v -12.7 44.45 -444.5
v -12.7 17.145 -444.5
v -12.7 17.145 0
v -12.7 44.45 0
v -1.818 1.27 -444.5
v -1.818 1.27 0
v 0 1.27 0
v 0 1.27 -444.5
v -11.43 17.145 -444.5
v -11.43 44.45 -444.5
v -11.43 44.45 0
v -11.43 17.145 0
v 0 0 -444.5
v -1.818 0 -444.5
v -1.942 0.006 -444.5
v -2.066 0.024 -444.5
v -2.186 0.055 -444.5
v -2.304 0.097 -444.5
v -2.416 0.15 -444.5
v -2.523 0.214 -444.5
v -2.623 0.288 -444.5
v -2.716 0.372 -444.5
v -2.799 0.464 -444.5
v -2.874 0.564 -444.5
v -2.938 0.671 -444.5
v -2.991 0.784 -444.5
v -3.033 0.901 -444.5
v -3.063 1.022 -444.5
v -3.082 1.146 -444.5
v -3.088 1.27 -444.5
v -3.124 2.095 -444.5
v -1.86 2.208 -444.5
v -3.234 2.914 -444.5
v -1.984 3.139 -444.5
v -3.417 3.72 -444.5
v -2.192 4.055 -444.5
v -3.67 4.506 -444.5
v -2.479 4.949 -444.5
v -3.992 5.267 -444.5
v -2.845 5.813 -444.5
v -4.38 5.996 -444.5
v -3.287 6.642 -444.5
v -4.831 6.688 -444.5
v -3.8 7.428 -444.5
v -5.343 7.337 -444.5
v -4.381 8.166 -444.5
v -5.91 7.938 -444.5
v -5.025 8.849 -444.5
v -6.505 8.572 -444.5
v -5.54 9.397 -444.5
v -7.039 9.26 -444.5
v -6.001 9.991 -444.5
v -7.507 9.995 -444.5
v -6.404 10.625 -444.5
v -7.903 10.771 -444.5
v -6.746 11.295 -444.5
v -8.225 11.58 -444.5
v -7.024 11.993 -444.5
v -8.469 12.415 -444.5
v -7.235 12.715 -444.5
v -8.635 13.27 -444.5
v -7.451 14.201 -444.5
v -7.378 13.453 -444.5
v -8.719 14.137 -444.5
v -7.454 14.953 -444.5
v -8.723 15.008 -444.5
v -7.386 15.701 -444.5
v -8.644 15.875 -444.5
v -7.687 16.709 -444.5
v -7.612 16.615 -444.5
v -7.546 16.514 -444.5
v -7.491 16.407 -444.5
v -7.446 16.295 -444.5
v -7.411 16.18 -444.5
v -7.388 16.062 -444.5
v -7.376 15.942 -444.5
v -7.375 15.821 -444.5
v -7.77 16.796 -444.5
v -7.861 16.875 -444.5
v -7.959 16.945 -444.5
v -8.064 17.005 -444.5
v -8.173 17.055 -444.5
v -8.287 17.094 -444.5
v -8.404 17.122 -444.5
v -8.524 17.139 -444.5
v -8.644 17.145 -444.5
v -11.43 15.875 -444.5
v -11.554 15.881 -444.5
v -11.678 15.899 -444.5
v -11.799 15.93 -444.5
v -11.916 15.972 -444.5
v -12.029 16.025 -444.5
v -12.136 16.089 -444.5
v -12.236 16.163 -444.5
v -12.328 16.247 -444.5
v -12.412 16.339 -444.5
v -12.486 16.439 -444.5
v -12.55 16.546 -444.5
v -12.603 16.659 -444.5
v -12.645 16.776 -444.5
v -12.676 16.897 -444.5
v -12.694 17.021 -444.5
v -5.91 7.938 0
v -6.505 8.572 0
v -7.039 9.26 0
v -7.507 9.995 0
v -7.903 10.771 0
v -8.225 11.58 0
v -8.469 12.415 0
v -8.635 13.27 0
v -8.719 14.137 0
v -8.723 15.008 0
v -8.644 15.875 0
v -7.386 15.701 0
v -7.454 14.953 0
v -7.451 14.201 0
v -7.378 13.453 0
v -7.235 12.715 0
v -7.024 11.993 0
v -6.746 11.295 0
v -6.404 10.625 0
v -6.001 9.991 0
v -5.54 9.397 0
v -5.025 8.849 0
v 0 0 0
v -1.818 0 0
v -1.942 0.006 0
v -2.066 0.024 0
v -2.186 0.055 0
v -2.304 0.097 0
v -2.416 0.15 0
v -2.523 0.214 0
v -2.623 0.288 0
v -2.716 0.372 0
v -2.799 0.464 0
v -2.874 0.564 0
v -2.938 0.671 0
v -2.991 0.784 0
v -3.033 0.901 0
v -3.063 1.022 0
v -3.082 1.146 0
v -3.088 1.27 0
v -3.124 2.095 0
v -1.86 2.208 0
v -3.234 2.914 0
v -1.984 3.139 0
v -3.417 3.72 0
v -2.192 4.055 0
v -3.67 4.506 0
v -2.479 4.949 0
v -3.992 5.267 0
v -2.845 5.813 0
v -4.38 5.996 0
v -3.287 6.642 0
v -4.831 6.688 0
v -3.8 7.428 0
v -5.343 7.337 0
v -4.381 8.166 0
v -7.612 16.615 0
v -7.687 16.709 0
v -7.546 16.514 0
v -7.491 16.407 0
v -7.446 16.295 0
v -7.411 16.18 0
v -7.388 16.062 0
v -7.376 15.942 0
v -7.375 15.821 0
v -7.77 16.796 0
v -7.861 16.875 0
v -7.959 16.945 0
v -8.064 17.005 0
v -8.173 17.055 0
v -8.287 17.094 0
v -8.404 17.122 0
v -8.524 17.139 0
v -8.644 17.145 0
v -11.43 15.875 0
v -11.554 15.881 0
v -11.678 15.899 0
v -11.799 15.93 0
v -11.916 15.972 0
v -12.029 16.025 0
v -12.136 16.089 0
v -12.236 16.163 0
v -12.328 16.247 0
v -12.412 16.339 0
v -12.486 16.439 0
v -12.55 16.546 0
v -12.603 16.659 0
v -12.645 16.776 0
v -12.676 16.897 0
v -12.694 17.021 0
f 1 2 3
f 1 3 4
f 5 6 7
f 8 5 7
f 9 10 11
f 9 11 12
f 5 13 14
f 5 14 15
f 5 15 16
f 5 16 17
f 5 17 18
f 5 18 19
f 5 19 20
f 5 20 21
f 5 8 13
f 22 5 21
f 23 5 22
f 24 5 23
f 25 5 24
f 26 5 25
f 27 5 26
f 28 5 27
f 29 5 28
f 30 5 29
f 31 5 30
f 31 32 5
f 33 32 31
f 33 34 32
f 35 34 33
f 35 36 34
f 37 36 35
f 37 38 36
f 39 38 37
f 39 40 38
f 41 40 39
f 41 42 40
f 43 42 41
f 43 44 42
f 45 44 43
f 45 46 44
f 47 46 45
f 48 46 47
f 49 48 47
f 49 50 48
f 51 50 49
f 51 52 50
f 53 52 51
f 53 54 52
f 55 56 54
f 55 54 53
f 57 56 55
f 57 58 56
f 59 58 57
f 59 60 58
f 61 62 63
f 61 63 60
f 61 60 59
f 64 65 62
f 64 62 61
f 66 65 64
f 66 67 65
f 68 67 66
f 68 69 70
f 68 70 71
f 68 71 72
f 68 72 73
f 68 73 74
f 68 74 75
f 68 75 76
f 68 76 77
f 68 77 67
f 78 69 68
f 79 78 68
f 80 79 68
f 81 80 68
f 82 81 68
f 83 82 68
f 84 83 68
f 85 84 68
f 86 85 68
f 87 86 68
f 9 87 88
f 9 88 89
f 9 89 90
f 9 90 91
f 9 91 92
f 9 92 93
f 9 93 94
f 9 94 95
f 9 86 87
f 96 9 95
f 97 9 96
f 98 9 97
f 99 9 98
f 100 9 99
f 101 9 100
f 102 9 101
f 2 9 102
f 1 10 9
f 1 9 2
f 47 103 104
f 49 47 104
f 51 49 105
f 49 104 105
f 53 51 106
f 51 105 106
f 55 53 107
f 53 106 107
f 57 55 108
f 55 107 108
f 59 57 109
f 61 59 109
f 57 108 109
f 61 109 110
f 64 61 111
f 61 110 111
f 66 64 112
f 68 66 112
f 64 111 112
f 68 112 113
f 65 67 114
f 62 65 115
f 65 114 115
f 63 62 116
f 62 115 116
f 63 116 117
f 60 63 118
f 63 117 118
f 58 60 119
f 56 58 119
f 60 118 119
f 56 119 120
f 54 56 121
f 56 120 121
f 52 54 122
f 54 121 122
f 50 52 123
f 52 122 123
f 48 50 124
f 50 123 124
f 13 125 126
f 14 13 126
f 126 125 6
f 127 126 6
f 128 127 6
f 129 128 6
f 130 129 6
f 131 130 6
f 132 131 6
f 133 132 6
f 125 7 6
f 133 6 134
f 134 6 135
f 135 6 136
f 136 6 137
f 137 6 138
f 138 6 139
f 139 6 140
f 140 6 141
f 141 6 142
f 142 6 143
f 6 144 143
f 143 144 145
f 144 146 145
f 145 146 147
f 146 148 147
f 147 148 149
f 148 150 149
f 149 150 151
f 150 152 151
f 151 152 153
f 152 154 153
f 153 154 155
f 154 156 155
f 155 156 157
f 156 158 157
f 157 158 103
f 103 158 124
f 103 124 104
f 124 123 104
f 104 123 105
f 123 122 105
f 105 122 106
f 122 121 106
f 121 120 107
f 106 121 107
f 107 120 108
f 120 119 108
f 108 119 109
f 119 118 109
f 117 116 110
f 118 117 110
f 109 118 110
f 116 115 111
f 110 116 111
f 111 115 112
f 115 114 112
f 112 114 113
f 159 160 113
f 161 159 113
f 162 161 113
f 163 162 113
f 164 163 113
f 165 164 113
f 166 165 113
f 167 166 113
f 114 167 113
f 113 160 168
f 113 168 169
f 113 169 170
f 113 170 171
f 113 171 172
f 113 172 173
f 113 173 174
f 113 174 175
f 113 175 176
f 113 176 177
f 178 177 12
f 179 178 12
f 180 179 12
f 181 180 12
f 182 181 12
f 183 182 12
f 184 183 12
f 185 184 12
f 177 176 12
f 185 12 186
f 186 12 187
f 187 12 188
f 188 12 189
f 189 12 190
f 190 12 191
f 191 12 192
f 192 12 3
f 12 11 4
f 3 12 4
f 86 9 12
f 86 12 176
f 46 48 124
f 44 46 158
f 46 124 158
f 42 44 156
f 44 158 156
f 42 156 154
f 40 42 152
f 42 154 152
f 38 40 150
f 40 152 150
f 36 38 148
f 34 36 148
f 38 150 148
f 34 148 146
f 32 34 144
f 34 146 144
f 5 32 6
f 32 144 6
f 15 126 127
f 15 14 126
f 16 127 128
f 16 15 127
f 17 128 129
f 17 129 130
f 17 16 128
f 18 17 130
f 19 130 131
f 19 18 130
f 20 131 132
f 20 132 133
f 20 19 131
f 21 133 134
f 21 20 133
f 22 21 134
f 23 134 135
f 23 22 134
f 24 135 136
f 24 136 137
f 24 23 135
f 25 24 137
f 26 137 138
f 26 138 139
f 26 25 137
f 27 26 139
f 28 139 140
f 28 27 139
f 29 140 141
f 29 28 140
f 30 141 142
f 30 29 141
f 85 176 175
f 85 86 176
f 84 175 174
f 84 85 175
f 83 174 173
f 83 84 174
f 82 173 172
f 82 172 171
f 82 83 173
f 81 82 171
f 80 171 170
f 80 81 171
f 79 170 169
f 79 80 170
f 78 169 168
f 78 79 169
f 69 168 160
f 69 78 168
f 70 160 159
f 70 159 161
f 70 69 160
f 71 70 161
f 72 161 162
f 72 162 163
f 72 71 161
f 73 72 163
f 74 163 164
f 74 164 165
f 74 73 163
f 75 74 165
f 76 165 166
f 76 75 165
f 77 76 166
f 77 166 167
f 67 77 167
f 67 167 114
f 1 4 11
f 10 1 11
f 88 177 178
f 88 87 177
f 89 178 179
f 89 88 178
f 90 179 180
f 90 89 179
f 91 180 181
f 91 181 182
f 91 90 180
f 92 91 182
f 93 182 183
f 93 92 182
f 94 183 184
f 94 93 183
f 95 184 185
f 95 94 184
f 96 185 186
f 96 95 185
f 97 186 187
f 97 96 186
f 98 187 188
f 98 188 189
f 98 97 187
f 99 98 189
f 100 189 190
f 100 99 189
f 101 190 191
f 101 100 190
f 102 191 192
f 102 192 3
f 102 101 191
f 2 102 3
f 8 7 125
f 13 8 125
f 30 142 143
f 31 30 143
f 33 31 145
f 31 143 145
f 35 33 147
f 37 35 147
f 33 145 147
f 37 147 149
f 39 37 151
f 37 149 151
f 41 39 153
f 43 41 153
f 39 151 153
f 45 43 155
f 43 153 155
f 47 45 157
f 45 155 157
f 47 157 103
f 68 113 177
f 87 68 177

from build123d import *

# Parameters (mm, degrees)
EXTRUDE_THIN1_DEPTH = 444.5
FILLET1_R           = 1.27


with BuildPart() as part:
    # Sketch1 → Extrude-Thin1 (new body)
    with BuildSketch(Plane.XY):
        with BuildLine():
            Line((0, 0), (-3.175, 0))
            ThreePointArc((-3.175, 0), (-3.594278481, 4.295332119), (-5.909507538, 7.9375))
            ThreePointArc((-5.909507538, 7.9375), (-8.224736594, 11.579667881), (-8.644015075, 15.875))
            Line((-8.644015075, 15.875), (-12.7, 15.875))
            Line((-12.7, 15.875), (-12.7, 44.45))
            Line((-12.7, 44.45), (-11.43, 44.45))
            Line((-11.43, 44.45), (-11.43, 17.145))
            Line((-11.43, 17.145), (-7.048306528, 17.145))
            ThreePointArc((-7.048306528, 17.145), (-7.232980949, 12.705393558), (-5.025332022, 8.849165321))
            ThreePointArc((-5.025332022, 8.849165321), (-2.652667269, 5.384979729), (-1.817765075, 1.27))
            Line((-1.817765075, 1.27), (0, 1.27))
            Line((0, 1.27), (0, 0))
        make_face()
    extrude(amount=-EXTRUDE_THIN1_DEPTH)

    # Fillet1
    fillet1_edges = [part.edges().sort_by_distance(p)[0] for p in [
        (-7.048306528, 17.145, -222.25),
        (-3.175, 0, -222.25),
        (-12.7, 15.875, -222.25),
    ]]
    fillet(fillet1_edges, radius=FILLET1_R)


solid = part.part
